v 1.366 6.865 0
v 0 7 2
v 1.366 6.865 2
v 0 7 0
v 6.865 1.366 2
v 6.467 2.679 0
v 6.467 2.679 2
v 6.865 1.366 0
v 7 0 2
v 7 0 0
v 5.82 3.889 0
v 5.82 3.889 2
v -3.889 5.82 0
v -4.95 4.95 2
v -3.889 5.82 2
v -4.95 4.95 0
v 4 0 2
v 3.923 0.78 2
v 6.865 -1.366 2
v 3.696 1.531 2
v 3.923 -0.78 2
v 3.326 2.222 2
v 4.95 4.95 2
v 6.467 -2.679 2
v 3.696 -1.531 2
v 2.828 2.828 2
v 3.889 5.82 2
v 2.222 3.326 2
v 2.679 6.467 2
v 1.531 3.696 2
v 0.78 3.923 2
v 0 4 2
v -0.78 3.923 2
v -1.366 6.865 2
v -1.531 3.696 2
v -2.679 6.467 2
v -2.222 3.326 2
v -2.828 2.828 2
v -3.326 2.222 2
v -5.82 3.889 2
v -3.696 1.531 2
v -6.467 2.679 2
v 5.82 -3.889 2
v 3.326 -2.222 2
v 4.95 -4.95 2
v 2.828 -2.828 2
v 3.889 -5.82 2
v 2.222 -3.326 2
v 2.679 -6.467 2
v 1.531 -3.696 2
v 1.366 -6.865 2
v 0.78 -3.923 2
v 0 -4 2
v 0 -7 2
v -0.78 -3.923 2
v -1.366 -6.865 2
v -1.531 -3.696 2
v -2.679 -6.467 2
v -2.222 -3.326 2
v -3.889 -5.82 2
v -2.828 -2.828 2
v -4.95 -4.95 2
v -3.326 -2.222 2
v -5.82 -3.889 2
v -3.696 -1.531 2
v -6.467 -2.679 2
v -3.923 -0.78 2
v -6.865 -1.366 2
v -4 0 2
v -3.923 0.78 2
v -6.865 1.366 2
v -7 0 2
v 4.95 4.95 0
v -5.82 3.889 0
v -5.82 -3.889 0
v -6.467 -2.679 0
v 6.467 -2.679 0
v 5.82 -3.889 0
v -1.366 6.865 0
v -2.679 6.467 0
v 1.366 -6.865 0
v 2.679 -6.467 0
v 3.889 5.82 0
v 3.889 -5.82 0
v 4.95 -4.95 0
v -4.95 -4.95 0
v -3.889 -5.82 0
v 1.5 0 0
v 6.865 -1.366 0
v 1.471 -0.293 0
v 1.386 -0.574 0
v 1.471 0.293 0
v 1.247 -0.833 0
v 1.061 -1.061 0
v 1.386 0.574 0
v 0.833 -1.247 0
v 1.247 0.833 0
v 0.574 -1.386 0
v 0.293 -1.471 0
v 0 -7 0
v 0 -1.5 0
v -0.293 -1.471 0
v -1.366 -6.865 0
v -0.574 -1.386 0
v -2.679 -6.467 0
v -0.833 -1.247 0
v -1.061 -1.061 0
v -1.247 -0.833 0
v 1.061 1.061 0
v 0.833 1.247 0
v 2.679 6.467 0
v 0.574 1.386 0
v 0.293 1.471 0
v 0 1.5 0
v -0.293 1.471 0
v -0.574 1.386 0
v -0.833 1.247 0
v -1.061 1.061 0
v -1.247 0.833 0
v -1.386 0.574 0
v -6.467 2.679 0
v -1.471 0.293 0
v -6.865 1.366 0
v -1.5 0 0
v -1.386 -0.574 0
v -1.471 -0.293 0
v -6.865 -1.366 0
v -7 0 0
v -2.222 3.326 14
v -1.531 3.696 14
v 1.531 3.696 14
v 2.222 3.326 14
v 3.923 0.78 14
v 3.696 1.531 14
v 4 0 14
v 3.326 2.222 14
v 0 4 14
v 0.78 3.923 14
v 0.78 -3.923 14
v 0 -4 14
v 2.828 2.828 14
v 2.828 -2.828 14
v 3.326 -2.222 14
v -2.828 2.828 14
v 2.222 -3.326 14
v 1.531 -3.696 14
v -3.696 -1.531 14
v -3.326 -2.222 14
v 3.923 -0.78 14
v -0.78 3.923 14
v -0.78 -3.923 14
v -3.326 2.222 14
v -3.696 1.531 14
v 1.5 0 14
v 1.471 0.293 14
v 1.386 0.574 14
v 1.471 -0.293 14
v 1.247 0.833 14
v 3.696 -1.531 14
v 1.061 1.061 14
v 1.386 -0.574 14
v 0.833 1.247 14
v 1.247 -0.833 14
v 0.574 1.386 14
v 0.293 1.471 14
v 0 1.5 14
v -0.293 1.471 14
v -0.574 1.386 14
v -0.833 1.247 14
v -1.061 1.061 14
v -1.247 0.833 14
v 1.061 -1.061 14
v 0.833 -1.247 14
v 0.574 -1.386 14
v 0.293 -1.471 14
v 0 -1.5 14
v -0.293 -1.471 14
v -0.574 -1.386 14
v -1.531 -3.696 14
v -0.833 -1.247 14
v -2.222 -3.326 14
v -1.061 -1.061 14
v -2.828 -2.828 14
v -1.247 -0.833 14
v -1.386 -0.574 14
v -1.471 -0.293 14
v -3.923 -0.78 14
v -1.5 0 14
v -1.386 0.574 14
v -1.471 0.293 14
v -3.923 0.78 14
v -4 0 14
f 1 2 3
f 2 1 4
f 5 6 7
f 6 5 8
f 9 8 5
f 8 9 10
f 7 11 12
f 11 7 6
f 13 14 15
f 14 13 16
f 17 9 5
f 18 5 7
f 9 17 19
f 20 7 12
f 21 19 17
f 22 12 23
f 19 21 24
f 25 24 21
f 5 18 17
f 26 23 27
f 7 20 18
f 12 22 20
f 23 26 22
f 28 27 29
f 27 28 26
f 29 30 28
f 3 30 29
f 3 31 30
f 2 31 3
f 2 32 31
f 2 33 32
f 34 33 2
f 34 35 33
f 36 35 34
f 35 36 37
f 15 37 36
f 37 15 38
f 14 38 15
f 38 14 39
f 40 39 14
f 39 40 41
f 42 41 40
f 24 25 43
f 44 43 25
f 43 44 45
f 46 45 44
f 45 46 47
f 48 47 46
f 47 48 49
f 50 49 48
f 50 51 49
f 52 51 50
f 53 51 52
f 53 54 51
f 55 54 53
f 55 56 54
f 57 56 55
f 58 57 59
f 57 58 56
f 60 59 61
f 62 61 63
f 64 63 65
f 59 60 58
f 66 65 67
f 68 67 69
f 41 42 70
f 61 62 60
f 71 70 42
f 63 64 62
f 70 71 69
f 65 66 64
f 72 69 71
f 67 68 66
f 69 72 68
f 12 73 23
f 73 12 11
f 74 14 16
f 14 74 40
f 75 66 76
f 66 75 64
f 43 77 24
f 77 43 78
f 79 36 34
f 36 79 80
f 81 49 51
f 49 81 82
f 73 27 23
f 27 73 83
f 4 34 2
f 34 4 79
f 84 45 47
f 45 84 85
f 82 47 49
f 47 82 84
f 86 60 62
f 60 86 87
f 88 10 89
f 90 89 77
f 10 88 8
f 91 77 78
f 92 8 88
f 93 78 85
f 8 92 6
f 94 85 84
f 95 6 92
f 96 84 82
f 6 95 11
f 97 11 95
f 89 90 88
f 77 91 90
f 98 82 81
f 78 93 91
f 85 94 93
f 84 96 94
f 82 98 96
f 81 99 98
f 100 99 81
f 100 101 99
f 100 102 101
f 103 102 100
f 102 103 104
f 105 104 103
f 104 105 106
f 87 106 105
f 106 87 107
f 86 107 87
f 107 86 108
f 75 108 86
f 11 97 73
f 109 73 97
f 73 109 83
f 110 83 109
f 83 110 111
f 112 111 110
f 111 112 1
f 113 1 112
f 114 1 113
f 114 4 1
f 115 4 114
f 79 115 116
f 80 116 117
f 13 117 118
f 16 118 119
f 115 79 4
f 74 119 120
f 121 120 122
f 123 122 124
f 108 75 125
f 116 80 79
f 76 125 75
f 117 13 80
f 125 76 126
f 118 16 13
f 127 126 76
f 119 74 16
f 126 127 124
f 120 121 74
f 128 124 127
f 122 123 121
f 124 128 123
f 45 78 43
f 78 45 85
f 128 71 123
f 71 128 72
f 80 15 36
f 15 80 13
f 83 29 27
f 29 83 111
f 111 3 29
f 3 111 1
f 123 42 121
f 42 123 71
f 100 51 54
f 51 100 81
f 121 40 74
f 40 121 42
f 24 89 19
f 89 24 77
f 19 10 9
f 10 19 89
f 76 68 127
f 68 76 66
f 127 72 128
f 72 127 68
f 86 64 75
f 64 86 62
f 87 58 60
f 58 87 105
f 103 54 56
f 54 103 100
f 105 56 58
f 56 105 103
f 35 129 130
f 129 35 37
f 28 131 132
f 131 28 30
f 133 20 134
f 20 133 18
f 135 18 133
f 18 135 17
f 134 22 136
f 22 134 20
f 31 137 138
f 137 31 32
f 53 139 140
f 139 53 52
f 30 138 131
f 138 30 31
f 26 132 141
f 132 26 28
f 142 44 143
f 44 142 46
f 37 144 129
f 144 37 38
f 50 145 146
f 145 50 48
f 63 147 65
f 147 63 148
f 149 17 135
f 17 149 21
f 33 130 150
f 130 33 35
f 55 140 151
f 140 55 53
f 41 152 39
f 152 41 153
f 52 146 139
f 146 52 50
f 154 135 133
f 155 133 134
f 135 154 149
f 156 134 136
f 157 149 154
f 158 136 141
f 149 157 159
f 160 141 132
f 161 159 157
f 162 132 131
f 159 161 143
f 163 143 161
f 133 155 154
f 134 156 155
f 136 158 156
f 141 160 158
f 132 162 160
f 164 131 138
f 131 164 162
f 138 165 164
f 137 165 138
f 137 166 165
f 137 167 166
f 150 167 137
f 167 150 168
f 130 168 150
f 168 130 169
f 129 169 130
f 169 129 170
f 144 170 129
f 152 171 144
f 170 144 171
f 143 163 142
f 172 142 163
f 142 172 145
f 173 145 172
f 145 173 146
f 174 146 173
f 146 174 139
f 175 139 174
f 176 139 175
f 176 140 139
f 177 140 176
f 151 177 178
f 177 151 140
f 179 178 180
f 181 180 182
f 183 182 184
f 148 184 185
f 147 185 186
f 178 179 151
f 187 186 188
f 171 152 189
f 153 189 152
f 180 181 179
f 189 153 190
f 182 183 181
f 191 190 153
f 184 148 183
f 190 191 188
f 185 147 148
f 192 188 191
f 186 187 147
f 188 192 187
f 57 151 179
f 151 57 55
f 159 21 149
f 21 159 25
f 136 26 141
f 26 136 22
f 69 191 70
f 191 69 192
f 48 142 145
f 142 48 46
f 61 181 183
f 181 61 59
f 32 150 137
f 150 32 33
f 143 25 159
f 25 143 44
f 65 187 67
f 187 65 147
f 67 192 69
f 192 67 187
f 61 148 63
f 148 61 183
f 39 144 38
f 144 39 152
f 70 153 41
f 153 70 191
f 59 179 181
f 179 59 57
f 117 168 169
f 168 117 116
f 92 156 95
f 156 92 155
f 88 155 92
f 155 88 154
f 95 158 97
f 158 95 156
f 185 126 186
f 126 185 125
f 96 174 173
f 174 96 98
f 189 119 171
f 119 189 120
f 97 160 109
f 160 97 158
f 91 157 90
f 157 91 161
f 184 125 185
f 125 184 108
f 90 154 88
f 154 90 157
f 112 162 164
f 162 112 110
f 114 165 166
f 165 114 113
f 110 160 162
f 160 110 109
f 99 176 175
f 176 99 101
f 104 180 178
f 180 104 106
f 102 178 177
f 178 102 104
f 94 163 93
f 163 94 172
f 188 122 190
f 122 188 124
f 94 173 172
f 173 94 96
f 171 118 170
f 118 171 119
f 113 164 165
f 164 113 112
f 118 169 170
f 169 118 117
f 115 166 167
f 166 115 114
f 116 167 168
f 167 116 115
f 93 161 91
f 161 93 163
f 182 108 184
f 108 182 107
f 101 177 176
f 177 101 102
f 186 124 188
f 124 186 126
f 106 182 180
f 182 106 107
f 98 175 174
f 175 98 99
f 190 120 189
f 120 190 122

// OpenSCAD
$fn = 32;

// ----------------------------------------------------------------------
// Micro post: flanged post, 5-20 mm class
// ----------------------------------------------------------------------

// --- parameters (mm) ---
post_d = 8;               // post diameter
post_h = 12;              // post height above the flange
flange_d = 14;            // flange diameter
flange_t = 2;             // flange thickness
bore_d = 3;               // through bore

total_h = post_h + flange_t;  // overall height

difference() {
  union() {
    cylinder(h = flange_t, d = flange_d);
    translate([0, 0, flange_t]) cylinder(h = post_h, d = post_d);
  }
  translate([0, 0, -1]) cylinder(h = total_h + 2, d = bore_d);
}
